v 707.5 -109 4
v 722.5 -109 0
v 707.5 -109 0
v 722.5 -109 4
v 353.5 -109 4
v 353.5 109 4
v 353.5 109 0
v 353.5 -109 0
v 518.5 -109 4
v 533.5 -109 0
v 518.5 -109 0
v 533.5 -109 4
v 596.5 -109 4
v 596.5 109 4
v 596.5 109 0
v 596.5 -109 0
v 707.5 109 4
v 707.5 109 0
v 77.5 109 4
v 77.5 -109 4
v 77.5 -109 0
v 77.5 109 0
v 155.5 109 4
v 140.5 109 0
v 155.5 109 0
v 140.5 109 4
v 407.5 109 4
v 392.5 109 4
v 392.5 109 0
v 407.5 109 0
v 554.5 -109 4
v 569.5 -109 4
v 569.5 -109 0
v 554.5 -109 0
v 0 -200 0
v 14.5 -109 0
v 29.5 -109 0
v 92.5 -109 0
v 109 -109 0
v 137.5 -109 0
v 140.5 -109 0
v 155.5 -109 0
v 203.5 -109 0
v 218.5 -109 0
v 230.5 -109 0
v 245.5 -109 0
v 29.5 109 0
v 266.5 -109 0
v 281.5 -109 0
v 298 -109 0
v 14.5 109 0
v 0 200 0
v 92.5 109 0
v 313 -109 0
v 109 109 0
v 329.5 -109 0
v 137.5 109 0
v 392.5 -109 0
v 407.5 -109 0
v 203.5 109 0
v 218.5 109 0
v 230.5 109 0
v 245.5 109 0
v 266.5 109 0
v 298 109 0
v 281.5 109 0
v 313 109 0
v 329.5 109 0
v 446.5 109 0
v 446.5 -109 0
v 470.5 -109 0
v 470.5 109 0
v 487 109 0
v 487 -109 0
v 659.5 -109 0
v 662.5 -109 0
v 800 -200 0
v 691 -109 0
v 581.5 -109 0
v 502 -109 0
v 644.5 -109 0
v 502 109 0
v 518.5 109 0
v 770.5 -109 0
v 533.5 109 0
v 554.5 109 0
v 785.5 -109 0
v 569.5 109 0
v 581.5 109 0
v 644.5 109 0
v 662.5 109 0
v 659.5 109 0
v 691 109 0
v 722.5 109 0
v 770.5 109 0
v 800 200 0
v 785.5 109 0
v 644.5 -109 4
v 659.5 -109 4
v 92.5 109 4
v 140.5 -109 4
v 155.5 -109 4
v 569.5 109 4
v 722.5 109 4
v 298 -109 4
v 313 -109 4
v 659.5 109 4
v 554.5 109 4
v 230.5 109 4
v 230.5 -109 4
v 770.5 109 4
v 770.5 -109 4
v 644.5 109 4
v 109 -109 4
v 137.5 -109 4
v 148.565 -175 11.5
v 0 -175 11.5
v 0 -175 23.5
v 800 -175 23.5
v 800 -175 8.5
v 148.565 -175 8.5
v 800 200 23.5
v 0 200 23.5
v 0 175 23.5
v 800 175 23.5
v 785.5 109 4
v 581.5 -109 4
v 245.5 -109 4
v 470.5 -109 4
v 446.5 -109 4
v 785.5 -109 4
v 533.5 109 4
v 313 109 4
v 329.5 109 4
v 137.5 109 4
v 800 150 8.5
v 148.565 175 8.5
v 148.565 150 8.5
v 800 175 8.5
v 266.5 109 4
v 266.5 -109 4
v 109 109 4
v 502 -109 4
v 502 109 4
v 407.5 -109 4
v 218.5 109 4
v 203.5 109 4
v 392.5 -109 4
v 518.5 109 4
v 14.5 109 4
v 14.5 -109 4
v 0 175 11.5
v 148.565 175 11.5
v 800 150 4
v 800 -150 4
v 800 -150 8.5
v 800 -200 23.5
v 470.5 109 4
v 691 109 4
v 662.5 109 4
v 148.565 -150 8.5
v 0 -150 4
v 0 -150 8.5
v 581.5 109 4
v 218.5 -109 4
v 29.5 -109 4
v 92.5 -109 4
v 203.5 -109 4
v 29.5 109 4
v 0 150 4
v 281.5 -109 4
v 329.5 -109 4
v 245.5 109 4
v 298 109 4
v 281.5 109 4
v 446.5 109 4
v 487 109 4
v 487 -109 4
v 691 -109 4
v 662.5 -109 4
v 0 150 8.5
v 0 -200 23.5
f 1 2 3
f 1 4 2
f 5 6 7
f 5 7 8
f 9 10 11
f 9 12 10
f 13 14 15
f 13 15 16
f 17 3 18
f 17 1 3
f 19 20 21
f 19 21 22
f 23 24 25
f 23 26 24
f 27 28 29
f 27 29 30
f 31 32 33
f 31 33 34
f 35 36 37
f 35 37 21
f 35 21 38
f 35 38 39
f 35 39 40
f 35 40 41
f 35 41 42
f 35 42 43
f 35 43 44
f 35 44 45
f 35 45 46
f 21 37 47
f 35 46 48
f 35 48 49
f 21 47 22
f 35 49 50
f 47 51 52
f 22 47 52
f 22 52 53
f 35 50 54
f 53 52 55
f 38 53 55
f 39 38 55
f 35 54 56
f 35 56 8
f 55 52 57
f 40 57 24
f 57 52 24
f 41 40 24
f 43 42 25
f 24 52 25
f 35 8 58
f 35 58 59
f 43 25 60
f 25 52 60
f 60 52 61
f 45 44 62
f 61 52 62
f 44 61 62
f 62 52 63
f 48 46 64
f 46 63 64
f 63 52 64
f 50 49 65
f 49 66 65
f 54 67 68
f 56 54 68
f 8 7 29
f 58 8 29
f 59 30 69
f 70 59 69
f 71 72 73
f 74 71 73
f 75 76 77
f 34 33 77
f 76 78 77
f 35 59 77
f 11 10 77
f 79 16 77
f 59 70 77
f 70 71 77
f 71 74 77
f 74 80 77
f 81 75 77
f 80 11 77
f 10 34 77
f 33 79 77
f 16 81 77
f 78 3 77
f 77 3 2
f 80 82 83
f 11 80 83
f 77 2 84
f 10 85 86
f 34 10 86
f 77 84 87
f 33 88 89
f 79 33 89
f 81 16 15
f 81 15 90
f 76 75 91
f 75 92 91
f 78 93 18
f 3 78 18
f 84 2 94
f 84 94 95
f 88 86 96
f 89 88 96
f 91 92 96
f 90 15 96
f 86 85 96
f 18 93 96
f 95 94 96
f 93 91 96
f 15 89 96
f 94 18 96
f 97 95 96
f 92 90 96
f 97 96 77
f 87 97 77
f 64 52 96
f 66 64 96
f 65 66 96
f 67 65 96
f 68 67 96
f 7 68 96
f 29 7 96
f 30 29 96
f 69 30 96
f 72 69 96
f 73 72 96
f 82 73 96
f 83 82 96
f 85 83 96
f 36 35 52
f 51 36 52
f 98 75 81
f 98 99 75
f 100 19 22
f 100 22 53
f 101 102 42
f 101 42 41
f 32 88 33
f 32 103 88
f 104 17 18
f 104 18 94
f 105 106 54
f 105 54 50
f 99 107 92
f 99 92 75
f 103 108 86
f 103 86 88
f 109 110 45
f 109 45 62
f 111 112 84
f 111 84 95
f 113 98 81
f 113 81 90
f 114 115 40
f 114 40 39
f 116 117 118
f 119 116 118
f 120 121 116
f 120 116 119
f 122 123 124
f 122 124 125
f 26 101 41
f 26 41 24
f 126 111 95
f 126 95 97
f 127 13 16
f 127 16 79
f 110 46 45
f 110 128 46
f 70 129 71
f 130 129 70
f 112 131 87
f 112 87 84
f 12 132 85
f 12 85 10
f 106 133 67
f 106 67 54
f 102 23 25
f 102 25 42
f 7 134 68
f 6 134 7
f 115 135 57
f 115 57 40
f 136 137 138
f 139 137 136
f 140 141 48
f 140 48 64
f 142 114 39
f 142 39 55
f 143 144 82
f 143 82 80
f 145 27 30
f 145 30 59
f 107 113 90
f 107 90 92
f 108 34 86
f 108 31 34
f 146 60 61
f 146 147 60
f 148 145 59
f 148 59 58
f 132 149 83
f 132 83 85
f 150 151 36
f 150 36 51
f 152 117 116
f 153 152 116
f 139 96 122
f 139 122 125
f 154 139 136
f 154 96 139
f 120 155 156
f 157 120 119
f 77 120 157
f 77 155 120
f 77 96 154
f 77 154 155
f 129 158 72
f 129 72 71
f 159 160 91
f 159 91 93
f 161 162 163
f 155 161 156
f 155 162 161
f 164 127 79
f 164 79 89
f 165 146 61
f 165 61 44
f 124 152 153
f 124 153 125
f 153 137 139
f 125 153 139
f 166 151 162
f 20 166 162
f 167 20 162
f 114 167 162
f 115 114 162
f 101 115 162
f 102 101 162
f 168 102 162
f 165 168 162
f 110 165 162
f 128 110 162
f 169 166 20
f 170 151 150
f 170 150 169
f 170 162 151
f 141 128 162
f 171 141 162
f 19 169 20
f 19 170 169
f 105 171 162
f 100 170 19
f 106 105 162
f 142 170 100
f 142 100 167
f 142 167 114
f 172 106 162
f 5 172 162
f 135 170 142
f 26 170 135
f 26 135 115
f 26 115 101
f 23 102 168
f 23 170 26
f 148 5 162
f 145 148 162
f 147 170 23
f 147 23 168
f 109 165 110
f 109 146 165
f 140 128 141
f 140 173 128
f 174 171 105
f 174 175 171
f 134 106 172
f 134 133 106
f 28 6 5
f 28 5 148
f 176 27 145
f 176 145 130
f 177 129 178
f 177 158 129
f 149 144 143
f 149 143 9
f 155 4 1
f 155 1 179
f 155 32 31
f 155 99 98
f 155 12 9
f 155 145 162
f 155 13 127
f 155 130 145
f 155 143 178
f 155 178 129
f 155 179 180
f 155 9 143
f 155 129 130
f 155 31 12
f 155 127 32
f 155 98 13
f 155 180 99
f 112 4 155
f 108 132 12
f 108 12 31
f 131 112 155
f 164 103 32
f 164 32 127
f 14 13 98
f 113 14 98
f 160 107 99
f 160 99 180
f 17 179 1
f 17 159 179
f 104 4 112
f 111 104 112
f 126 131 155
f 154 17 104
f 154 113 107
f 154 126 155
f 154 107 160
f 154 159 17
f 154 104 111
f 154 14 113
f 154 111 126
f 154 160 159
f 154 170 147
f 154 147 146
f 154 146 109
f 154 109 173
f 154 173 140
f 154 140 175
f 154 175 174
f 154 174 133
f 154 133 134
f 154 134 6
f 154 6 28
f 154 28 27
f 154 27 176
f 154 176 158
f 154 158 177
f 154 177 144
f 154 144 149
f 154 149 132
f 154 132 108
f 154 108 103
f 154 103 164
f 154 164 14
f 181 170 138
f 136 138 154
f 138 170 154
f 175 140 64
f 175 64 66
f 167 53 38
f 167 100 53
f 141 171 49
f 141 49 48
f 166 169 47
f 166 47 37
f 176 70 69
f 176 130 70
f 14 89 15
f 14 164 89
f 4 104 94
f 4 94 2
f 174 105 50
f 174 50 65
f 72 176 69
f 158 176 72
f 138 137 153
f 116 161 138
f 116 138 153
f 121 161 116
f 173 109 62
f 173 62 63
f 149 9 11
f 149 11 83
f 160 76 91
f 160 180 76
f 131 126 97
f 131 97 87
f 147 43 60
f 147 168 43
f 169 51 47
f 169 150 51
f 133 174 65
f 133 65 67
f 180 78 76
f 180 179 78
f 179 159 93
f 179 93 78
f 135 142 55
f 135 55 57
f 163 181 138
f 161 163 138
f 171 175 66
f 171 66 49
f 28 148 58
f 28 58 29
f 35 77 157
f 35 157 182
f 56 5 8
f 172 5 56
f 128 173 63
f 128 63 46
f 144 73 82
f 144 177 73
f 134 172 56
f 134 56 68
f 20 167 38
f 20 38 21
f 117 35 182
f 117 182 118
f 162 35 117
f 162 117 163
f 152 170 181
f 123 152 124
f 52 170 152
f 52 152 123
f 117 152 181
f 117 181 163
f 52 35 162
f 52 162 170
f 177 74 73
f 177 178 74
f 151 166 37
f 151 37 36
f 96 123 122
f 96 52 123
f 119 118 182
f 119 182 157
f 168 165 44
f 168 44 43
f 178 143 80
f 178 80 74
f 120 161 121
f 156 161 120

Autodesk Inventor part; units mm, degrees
ref_plane "YZ Plane" through (0, 0, 0) normal (1, 0, 0) x (0, 1, 0)
sketch "ferrite_layer_outline_sketch" plane through (0, 0, 0) normal (0, 0, 1) x (1, 0, 0)
  line L0 (0, 200) -> (800, 200)
  line L1 (800, 200) -> (800, -200)
  line L2 (800, -200) -> (0, -200)
  line L3 (0, -200) -> (0, 200)
  line L4 (-160, 0) -> (960, 0) projected
  line L5 (400, 200) -> (400, -200) construction
  line L6 (400, 366.8869) -> (400, -324.3455) construction
  line L7 (400, 200) -> (400, -200)
  point P0 (0, 0)
  point P1 (0, 0)
  point P2 (0, 0)
  point P3 (0, 0)
  point P4 (20, 0)
  dimension "d0" = 800
  dimension "d1" = 400
extrude "Extrusion8" add sketch "ferrite_layer_outline_sketch" along normal blind 4
ref_plane "acrylic_sheet_plane" through (0, 0, 4) normal (0, 0, 1) x (1, 0, 0)
sketch "Sketch4" plane through (0, 0, 4) normal (0, 0, 1) x (1, 0, 0)
  line L0 (14.5, 109) -> (29.5, 109)
  line L1 (29.5, 109) -> (29.5, -109)
  line L2 (29.5, -109) -> (14.5, -109)
  line L3 (14.5, -109) -> (14.5, 109)
  line L4 (-12.6534, 0) -> (47.471, 0)
  line L5 (0, 200) -> (0, -200) projected
  line L6 (800, 200) -> (0, 200) projected
  line L7 (0, -200) -> (800, -200) projected
  point P0 (0, 0)
  point P1 (14.5, 0)
  point P2 (0, 0)
  dimension "d43" = 15
  dimension "d44" = 218
  dimension "d45" = 14.5
extrude "Extrusion9" cut sketch "Sketch4" against normal through all
pattern_linear "Rectangular Pattern 7 fer" count 7 spacing 126 along (1, 0, 0) of "Extrusion9"
pattern_linear "Rectangular Pattern 8 fer" count 8 spacing 108 along (1, 0, 0) of "Extrusion9"
pattern_linear "pattern_test_#_of_ferrites 9 fer" count 9 spacing 94.5 along (1, 0, 0) of "Extrusion9"
pattern_linear "Rectangular Pattern 10 fer" [suppressed]
pattern_linear "Rectangular Pattern 13" count 13 spacing 63 along (1, 0, 0) of "Extrusion9"
sketch "Sketch5" plane through (0, 0, 4) normal (0, 0, 1) x (1, 0, 0)
  line L0 (0, 200) -> (0, -200) projected
  line L1 (0, 150) -> (800, 150)
  line L2 (800, -200) -> (800, 200) projected
  line L3 (800, 200) -> (0, 200) projected
  line L4 (0, -200) -> (800, -200) projected
  line L5 (0, -150) -> (800, -150)
  point P0 (0, 0)
  dimension "d66" = 50
  dimension "d68" = 50
extrude "Extrusion10" add sketch "Sketch5" along normal blind 4.5 contours L3 L2 L1 L0 | L5 L2 L4 L0
ref_plane "lower test Plane" through (0, 0, 8.5) normal (0, 0, 1) x (1, 0, 0)
sketch "Sketch7" plane through (0, 0, 8.5) normal (0, 0, 1) x (1, 0, 0)
  line L0 (0, 200) -> (0, -200) projected
  line L1 (0, 175) -> (800, 175)
  line L2 (800, -200) -> (800, 200) projected
  line L3 (0, -175) -> (800, -175)
  line L4 (800, 200) -> (0, 200) projected
  line L5 (0, -200) -> (800, -200) projected
  line L6 (148.5652, 175) -> (148.5652, -175)
  point P0 (0, 0)
  dimension "d77" = 25
  dimension "d78" = 25
extrude "wall extrusion" add sketch "Sketch7" along normal blind 15 contours L4 L2 L1 L0 | L3 L2 L5 L0
extrude "Extrusion14" add sketch "Sketch7" along normal blind 3 contours L1 L6 L3 L0
equation "\"d0\" = track_length"
equation "\"d1\" = track_width"
equation "\"d43\" = ferrite_width"
equation "\"d44\" = ferrite_length"
equation "\"d45\" = gap_distance"
equation "\"d50\" = parameter_5"
equation "\"d62\" = test_parameter_5"
equation "\"track_length\" = 800"
equation "\"track_width\" = 400"
equation "\"gap_distance\" = 14.5"
equation "\"ferrite_length\" = 218"
equation "\"ferrite_width\" = 15"
equation "\"ferrite_height\" = 8"
equation "\"acrylic_sheet_8mm\" = 8"
equation "\"parameter_5\" = 126"
equation "\"test_parameter_5\" = 94.5"
properties part number "ferrite_layer_dex_0R2"
